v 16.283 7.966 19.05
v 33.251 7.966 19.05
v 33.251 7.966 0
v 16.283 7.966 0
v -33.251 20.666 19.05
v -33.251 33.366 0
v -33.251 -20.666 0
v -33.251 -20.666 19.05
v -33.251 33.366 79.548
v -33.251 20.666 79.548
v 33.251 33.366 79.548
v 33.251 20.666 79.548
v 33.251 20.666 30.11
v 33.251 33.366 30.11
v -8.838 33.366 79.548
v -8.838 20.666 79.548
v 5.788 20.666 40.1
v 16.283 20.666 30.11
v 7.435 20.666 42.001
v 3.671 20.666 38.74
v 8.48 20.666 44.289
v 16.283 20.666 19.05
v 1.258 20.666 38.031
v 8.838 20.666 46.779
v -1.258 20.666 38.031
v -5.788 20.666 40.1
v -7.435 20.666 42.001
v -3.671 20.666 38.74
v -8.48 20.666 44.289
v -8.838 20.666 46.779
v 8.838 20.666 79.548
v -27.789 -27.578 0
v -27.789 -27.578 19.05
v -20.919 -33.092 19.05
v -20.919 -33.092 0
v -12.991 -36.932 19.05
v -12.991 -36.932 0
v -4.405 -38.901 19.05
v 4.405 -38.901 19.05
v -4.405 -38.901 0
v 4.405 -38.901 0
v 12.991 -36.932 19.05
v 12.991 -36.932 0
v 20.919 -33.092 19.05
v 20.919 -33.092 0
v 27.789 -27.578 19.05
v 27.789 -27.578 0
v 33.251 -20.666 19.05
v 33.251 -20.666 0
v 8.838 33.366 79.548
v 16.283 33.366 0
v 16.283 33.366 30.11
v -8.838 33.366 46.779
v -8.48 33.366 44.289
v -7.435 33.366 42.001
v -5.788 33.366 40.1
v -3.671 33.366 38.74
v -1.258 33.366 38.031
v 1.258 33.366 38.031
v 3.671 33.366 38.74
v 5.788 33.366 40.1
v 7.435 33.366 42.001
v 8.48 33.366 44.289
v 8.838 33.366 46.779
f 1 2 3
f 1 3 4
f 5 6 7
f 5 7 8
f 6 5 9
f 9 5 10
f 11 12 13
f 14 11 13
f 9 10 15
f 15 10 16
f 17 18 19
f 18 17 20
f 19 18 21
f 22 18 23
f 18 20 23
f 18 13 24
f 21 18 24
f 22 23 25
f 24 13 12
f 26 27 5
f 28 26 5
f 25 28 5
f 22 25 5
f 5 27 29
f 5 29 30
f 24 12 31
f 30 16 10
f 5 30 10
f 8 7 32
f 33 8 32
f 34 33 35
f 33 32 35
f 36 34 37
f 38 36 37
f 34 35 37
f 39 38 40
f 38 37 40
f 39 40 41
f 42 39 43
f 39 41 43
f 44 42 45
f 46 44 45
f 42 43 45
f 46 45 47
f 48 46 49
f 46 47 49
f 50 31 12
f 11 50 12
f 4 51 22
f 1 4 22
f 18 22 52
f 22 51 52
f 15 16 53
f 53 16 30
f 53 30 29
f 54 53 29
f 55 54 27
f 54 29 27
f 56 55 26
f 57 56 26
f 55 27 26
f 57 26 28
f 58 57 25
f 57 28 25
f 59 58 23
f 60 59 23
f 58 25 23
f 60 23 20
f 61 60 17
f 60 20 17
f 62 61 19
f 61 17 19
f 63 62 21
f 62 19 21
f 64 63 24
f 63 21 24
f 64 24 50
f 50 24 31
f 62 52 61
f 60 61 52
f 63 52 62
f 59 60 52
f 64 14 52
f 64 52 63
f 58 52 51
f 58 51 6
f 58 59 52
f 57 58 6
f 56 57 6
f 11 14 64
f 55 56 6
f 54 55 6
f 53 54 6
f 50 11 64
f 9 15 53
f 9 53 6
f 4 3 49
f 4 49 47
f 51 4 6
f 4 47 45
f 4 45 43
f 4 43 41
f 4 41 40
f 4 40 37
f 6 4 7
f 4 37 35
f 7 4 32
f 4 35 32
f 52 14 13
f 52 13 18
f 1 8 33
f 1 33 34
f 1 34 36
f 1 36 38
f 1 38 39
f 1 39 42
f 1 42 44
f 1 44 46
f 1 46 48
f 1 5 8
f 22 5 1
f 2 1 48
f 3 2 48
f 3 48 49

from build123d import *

# Parameters (mm, degrees)
F1_DEPTH = 19.05
F3_DEPTH = 12.7
F4_W     = 16.968144
F4_H     = 30.109933
F5_DEPTH = 25.4


with BuildPart() as f1:
    # F0 (on Top) → F1 (new body)
    with BuildSketch(Plane.XY):
        with BuildLine():
            Line((33.250909, -20.666365), (33.250909, 20.666365))
            Line((33.250909, 20.666365), (-33.250909, 20.666365))
            Line((-33.250909, 20.666365), (-33.250909, -20.666365))
            ThreePointArc((-33.250909, -20.666365), (0, -39.149988), (33.250909, -20.666365))
        make_face()
    extrude(amount=F1_DEPTH)

    # F2 (on face) → F3 (join)
    with BuildSketch(Plane(origin=(0, 20.666365, 0), x_dir=(-1, 0, 0), z_dir=(0, 1, 0))):
        with BuildLine():
            Line((-33.250909, 19.05), (-33.250909, 0))
            Line((-33.250909, 0), (33.250909, 0))
            Line((33.250909, 0), (33.250909, 19.05))
            Line((33.250909, 19.05), (33.250909, 79.54818))
            Line((33.250909, 79.54818), (8.83812, 79.54818))
            Line((8.83812, 79.54818), (8.83812, 46.779379))
            ThreePointArc((8.83812, 46.779379), (0, 37.941259), (-8.83812, 46.779379))
            Line((-8.83812, 46.779379), (-8.83812, 79.54818))
            Line((-8.83812, 79.54818), (-15.810801, 79.54818))
            Line((-15.810801, 79.54818), (-33.250909, 79.54818))
            Line((-33.250909, 79.54818), (-33.250909, 19.05))
        make_face()
    extrude(amount=F3_DEPTH)

    # F4 (on face) → F5 (cut)
    with BuildSketch(Plane(origin=(0, 33.366365, 0), x_dir=(-1, 0, 0), z_dir=(0, 1, 0))):
        with Locations((-24.766837, 15.054966)):
            Rectangle(F4_W, F4_H)
    extrude(amount=-F5_DEPTH, mode=Mode.SUBTRACT)


solid = f1.part
